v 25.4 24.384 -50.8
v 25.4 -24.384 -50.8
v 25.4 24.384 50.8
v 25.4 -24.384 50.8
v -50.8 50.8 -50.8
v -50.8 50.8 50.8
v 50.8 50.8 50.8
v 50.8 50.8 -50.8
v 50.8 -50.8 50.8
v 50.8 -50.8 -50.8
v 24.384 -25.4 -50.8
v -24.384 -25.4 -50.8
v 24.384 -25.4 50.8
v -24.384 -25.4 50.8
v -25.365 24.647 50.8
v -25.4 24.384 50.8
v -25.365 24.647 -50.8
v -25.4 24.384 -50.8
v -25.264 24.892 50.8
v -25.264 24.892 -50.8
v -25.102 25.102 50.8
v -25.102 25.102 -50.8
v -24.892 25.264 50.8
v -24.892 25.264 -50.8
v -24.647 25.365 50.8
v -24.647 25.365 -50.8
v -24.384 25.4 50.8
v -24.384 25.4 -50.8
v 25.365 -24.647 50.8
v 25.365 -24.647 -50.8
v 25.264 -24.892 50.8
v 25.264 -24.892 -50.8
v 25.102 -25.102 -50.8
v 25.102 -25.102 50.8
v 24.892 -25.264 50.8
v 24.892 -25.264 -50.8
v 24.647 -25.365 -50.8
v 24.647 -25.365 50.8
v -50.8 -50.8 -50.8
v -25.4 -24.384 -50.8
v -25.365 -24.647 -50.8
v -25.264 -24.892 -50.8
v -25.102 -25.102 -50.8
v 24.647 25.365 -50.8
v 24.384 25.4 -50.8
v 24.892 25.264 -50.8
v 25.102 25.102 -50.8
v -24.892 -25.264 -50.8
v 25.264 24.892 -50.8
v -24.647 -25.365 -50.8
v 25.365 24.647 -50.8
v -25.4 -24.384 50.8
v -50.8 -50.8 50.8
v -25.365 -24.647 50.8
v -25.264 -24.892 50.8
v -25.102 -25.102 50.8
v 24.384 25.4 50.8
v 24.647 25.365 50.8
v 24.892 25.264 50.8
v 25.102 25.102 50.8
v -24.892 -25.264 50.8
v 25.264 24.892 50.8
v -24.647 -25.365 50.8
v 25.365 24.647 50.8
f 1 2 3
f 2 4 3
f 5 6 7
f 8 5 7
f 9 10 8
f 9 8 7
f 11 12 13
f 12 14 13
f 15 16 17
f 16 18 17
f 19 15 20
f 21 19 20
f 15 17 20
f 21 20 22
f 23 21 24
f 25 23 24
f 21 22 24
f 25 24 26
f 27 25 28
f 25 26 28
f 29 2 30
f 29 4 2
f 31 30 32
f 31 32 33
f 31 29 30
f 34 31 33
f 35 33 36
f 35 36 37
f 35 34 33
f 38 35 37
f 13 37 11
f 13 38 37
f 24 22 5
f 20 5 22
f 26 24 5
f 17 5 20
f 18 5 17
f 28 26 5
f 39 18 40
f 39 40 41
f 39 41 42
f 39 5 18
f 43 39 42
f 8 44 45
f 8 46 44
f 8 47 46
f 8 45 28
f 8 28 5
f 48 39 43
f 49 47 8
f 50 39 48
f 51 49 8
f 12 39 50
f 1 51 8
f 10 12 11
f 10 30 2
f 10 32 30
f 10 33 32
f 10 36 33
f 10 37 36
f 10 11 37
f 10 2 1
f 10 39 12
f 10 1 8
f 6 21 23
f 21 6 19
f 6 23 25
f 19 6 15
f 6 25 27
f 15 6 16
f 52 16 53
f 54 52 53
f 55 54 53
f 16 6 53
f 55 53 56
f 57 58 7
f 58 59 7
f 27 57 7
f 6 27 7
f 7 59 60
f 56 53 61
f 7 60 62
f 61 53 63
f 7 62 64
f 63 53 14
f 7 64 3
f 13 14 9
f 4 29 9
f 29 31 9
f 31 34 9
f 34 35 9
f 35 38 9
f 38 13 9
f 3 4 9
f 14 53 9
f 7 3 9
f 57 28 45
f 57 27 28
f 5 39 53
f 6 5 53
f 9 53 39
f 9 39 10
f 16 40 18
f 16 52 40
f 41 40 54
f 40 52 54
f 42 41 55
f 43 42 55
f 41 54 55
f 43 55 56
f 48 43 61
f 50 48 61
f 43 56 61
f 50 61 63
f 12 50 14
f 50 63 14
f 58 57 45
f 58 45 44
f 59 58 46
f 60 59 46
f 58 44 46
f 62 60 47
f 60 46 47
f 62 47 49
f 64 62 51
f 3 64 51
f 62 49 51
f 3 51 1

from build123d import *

# Parameters (mm, degrees)
F0_W     = 101.6
F0_H     = 101.6
F1_DEPTH = 50.8
F2_W     = 50.8
F2_H     = 50.8
F3_DEPTH = 50.8
F4_R     = 1.016


with BuildPart() as f1:
    # F0 (on Front) → F1 (new body, symmetric)
    with BuildSketch(Plane.XZ):
        Rectangle(F0_W, F0_H)
    extrude(amount=F1_DEPTH, both=True)

    # F2 (on Top) → F3 (cut, symmetric)
    with BuildSketch(Plane.XY):
        Rectangle(F2_W, F2_H)
    extrude(amount=F3_DEPTH, both=True, mode=Mode.SUBTRACT)

    # F4
    f4_edges = [f1.edges().sort_by_distance(p)[0] for p in [
        (-25.4, -25.4, 0),
        (-25.4, 25.4, 0),
        (25.4, 25.4, 0),
        (25.4, -25.4, 0),
    ]]
    fillet(f4_edges, radius=F4_R)


solid = f1.part
